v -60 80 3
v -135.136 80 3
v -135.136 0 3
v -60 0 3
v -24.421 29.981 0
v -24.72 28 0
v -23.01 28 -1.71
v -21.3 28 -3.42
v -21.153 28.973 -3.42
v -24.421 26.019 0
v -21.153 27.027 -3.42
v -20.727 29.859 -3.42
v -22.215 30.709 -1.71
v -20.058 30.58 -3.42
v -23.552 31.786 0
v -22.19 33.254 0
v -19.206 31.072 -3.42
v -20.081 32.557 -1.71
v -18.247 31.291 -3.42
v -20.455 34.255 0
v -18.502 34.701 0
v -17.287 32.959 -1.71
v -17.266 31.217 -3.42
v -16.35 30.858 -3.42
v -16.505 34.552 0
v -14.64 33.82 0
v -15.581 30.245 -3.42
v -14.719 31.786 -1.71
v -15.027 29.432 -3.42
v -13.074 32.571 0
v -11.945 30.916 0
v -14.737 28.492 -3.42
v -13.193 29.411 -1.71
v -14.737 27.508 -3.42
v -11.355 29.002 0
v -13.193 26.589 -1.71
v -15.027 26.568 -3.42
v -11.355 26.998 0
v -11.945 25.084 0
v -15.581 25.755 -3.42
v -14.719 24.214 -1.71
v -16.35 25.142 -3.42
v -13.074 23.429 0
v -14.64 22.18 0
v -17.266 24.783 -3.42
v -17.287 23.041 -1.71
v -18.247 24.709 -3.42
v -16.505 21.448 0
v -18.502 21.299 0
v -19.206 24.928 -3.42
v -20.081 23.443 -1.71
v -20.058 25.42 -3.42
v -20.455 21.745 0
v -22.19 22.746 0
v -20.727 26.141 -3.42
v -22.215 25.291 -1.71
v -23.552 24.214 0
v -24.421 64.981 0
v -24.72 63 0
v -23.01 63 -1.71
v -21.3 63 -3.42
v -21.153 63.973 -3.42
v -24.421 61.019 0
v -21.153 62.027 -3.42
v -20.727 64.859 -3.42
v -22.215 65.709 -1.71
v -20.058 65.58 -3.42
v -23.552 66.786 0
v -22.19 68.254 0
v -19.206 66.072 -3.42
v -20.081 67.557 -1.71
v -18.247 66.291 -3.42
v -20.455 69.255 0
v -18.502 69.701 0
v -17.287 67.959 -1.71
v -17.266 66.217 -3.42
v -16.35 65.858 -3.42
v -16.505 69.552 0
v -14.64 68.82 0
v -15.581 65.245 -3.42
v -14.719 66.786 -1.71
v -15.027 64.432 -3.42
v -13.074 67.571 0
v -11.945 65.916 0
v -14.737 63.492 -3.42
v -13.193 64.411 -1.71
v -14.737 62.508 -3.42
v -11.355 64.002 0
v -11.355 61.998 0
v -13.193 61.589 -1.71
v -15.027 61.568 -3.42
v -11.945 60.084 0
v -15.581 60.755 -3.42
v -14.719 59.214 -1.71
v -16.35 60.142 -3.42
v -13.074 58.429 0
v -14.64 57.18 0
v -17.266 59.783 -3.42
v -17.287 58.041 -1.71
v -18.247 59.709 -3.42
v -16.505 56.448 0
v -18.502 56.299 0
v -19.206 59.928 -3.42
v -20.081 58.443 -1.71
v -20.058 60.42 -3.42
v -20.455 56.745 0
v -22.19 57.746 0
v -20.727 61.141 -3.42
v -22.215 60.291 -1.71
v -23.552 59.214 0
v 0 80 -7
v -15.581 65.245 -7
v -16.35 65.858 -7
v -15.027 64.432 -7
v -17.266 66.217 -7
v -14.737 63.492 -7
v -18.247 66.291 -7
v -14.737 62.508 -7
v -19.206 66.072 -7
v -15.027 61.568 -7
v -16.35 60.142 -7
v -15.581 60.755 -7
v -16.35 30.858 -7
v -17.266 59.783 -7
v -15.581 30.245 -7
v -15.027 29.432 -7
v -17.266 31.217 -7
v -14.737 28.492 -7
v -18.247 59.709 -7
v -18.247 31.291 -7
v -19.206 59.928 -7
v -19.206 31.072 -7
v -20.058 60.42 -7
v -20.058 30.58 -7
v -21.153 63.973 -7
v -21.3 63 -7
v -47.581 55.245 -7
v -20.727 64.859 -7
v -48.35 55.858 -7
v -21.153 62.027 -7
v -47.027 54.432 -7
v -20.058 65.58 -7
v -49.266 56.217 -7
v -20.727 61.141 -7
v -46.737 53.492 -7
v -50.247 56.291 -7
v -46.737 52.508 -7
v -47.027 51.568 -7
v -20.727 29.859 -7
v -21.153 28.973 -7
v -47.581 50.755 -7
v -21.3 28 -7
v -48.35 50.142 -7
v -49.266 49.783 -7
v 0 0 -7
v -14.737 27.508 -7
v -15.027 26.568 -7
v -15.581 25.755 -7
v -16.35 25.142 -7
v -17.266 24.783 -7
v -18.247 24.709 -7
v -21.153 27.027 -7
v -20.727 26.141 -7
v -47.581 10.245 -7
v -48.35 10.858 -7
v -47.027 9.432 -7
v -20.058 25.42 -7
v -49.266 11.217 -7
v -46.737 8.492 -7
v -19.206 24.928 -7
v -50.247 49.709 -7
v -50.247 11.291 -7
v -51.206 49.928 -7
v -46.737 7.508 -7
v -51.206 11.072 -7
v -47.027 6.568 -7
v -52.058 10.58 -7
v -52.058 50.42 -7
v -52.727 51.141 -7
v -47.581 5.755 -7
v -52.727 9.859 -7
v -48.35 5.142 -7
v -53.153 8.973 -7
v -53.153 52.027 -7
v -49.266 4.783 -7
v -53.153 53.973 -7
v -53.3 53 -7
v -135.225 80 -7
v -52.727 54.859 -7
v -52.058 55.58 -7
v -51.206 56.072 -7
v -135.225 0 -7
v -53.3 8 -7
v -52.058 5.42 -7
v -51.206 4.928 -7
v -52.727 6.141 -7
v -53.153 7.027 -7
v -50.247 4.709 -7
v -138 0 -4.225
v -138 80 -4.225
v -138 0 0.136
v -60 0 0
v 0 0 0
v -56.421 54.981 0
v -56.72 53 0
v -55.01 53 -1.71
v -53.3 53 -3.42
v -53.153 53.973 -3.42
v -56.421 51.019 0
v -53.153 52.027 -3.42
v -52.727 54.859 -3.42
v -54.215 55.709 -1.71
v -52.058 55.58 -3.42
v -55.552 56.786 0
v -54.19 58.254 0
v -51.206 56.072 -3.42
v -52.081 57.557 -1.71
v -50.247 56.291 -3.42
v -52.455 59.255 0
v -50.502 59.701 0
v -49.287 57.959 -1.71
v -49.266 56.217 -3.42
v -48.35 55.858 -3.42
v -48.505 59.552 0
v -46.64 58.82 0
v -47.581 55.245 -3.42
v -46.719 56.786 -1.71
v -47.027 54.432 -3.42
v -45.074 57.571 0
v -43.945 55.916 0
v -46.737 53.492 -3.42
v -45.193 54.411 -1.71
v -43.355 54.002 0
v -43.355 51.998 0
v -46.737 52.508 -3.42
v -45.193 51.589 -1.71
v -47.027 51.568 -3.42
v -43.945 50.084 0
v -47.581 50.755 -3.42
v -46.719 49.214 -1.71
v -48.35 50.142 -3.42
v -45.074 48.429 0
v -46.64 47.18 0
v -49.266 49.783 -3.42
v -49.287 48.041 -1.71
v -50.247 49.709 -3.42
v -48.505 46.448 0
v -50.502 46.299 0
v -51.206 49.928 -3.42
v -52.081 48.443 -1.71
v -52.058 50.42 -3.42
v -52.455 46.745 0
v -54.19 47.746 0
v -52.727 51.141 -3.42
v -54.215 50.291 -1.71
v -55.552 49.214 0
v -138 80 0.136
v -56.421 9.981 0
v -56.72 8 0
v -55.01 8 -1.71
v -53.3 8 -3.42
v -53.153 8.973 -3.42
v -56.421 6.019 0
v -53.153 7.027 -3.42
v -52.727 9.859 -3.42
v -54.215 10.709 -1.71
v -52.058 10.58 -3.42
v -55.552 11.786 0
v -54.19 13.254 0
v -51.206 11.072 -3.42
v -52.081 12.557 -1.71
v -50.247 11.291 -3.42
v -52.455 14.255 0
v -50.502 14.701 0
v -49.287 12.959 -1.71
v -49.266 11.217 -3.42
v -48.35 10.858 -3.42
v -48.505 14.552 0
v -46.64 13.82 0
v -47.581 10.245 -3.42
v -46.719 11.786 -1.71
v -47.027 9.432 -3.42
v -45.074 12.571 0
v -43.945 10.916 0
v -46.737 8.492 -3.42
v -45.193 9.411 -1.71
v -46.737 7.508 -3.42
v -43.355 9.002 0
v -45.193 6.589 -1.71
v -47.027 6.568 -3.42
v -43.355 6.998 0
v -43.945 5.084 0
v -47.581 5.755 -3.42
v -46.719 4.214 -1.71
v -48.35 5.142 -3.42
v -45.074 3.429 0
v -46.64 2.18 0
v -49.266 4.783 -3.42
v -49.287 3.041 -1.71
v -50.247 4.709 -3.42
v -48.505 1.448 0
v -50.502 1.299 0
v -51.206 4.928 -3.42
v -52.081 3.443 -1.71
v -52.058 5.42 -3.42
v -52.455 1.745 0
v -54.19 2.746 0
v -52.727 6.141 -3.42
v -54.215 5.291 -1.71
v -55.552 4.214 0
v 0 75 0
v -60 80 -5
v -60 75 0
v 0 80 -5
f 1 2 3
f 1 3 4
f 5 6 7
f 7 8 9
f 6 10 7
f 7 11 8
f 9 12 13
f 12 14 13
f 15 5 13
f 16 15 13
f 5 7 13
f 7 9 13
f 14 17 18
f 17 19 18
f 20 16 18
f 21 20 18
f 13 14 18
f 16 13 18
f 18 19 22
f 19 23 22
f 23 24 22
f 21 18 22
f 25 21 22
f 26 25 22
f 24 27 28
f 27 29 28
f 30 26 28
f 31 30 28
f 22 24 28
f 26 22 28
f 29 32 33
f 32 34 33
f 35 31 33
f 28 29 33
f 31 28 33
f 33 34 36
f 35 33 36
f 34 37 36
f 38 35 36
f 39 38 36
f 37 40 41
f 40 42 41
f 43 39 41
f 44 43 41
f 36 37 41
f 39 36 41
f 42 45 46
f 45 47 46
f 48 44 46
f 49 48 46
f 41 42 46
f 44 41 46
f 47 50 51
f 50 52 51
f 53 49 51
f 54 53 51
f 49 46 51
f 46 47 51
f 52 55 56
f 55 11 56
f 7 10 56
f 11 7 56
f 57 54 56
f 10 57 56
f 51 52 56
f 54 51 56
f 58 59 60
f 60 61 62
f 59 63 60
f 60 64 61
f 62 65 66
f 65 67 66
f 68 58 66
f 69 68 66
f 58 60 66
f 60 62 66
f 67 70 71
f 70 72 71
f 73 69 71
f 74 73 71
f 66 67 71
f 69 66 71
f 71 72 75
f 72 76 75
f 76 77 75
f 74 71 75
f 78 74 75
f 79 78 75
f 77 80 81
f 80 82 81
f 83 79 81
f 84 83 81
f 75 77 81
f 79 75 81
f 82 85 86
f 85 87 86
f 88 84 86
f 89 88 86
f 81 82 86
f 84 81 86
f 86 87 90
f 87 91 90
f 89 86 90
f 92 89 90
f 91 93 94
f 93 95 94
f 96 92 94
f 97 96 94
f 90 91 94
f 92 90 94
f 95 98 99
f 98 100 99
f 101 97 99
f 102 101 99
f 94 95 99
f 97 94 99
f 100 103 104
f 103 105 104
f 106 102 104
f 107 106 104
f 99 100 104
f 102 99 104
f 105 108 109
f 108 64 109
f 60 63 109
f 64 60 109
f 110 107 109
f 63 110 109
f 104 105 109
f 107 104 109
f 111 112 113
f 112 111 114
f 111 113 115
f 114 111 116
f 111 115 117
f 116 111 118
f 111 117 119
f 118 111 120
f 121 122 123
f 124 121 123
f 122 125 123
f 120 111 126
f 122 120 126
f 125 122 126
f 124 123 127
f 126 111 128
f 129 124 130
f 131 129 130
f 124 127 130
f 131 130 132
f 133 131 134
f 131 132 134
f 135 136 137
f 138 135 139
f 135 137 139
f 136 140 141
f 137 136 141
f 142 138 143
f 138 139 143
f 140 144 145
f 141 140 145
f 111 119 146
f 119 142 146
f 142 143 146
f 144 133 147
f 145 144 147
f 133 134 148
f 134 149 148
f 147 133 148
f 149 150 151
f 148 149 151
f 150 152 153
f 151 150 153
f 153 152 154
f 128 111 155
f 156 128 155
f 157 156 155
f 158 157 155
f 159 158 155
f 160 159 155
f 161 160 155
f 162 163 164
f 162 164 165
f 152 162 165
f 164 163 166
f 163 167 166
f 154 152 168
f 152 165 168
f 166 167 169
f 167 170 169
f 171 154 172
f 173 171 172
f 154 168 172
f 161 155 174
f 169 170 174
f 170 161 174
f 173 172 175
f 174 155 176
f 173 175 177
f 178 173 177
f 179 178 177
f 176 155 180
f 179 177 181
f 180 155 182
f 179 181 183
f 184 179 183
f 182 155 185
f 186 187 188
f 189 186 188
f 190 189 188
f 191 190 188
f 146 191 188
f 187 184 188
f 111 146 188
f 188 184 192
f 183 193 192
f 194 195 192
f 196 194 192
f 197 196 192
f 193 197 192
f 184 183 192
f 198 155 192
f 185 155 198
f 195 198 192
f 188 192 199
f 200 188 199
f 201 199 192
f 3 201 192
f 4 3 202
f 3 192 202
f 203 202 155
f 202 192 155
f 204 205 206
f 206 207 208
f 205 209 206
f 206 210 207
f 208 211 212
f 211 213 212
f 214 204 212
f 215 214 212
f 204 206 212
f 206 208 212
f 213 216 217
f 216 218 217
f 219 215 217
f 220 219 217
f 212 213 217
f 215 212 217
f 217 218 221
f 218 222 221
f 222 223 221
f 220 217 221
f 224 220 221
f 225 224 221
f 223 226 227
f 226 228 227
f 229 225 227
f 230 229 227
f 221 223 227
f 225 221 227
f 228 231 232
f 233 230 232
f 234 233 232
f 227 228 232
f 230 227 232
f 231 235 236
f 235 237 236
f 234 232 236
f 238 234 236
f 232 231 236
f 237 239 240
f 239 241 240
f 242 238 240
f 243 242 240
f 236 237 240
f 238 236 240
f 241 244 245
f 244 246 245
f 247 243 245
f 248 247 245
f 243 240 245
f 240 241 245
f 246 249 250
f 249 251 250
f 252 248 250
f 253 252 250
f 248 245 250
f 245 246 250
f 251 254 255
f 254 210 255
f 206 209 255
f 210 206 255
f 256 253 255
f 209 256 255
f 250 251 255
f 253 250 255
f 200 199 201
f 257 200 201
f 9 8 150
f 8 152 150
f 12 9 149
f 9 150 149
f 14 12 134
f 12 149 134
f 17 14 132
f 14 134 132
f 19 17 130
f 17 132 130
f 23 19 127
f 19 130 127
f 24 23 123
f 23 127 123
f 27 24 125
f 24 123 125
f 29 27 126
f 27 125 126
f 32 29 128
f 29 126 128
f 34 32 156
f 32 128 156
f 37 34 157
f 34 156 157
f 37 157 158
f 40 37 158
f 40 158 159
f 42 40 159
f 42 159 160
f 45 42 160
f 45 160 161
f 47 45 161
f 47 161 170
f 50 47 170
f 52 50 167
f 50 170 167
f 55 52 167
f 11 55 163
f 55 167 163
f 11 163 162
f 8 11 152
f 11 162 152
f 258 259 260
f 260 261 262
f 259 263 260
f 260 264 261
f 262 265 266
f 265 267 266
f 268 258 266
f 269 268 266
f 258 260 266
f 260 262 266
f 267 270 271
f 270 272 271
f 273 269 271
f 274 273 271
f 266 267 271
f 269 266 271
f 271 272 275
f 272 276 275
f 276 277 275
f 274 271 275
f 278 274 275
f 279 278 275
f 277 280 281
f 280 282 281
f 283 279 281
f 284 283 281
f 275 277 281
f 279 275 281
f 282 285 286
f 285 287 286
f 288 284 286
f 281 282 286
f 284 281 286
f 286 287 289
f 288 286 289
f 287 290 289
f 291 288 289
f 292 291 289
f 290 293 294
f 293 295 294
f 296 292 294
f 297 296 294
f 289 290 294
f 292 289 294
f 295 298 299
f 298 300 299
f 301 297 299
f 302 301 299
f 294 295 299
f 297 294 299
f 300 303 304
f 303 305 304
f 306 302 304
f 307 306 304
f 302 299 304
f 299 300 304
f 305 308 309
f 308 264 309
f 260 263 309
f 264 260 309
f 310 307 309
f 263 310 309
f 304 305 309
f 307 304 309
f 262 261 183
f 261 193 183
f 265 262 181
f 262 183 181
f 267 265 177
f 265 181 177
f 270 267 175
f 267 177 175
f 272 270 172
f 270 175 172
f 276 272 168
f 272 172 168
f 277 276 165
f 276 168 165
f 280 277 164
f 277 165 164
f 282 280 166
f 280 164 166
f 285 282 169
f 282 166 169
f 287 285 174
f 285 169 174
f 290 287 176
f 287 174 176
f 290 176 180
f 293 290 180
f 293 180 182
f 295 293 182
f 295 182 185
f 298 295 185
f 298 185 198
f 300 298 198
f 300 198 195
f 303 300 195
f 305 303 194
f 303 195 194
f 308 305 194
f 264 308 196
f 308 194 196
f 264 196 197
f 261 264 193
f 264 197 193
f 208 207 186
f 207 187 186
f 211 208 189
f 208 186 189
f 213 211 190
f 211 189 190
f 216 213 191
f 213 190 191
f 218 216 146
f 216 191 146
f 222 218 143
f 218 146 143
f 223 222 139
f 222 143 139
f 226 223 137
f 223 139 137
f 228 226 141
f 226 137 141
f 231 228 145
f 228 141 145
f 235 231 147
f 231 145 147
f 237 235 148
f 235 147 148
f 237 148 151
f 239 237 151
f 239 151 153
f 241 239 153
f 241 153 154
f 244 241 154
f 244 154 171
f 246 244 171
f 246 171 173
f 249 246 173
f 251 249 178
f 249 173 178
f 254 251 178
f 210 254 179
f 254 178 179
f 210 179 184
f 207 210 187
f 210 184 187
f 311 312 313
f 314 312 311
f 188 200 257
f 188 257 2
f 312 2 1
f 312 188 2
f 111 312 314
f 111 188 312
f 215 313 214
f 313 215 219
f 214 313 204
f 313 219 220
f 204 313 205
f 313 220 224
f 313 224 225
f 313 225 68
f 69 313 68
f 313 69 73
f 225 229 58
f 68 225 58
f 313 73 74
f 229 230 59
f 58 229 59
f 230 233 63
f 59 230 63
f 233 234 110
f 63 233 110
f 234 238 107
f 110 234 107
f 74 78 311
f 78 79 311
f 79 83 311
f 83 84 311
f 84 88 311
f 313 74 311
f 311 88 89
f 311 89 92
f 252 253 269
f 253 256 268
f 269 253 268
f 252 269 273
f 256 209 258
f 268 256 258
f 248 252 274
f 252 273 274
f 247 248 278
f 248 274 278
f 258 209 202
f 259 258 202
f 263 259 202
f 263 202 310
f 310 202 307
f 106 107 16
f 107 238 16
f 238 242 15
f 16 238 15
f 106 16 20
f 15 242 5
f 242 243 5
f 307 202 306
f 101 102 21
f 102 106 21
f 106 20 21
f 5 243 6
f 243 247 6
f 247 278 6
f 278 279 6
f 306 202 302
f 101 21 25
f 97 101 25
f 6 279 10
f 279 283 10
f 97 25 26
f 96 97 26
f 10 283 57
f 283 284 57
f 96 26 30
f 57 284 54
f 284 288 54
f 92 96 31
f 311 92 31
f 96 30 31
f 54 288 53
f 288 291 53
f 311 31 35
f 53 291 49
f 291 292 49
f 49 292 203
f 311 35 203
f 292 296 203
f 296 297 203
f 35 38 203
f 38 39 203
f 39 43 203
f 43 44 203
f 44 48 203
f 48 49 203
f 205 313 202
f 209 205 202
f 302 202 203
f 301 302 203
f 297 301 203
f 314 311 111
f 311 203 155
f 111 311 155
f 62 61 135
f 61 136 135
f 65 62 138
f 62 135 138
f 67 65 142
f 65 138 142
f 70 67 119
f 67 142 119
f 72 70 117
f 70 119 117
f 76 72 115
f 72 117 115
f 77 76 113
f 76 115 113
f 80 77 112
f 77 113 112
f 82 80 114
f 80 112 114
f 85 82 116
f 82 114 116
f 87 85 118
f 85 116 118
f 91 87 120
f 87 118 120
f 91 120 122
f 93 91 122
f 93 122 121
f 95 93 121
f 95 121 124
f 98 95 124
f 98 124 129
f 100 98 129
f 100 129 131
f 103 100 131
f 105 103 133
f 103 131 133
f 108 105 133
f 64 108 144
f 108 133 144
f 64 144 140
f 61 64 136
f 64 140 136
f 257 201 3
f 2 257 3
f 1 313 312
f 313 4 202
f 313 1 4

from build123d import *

# Parameters (mm, degrees)
RESSALTO_EXTRUS_O1_DEPTH                            = 80
CHANFRO2_SIZE                                       = 5
ESCAREADO_PARA_PARAFUSO_ALLEN_SEXTAVADO_D           = 6.6
ESCAREADO_PARA_PARAFUSO_ALLEN_SEXTAVADO_CSINK_D     = 13.44
ESCAREADO_PARA_PARAFUSO_ALLEN_SEXTAVADO_CSINK_ANGLE = 90


with BuildPart() as part:
    # Esboço1 → Ressalto-extrusão1 (new body)
    with BuildSketch(Plane(origin=(0, 0, 0), x_dir=(1, 0, 0), z_dir=(0, 1, 0))):
        Polygon((0, 0), (0, 7), (-135.225243436, 7), (-138, 4.225243436), (-138, -0.135644581), (-135.135644581, -3), (-60, -3), (-60, 0), align=None)
    extrude(amount=RESSALTO_EXTRUS_O1_DEPTH)

    # Chanfro2
    chanfro2_edges = [part.edges().sort_by_distance(p)[0] for p in [
        (-30, 80, 0),
    ]]
    chamfer(chanfro2_edges, length=CHANFRO2_SIZE)

    # Escareado para parafuso Allen sextavado escareado de M62 (through all)
    with Locations(Plane.XY):
        with Locations((-18, 63), (-50, 53), (-18, 28), (-50, 8)):
            CounterSinkHole(ESCAREADO_PARA_PARAFUSO_ALLEN_SEXTAVADO_D / 2, ESCAREADO_PARA_PARAFUSO_ALLEN_SEXTAVADO_CSINK_D / 2, counter_sink_angle=ESCAREADO_PARA_PARAFUSO_ALLEN_SEXTAVADO_CSINK_ANGLE)


solid = part.part
